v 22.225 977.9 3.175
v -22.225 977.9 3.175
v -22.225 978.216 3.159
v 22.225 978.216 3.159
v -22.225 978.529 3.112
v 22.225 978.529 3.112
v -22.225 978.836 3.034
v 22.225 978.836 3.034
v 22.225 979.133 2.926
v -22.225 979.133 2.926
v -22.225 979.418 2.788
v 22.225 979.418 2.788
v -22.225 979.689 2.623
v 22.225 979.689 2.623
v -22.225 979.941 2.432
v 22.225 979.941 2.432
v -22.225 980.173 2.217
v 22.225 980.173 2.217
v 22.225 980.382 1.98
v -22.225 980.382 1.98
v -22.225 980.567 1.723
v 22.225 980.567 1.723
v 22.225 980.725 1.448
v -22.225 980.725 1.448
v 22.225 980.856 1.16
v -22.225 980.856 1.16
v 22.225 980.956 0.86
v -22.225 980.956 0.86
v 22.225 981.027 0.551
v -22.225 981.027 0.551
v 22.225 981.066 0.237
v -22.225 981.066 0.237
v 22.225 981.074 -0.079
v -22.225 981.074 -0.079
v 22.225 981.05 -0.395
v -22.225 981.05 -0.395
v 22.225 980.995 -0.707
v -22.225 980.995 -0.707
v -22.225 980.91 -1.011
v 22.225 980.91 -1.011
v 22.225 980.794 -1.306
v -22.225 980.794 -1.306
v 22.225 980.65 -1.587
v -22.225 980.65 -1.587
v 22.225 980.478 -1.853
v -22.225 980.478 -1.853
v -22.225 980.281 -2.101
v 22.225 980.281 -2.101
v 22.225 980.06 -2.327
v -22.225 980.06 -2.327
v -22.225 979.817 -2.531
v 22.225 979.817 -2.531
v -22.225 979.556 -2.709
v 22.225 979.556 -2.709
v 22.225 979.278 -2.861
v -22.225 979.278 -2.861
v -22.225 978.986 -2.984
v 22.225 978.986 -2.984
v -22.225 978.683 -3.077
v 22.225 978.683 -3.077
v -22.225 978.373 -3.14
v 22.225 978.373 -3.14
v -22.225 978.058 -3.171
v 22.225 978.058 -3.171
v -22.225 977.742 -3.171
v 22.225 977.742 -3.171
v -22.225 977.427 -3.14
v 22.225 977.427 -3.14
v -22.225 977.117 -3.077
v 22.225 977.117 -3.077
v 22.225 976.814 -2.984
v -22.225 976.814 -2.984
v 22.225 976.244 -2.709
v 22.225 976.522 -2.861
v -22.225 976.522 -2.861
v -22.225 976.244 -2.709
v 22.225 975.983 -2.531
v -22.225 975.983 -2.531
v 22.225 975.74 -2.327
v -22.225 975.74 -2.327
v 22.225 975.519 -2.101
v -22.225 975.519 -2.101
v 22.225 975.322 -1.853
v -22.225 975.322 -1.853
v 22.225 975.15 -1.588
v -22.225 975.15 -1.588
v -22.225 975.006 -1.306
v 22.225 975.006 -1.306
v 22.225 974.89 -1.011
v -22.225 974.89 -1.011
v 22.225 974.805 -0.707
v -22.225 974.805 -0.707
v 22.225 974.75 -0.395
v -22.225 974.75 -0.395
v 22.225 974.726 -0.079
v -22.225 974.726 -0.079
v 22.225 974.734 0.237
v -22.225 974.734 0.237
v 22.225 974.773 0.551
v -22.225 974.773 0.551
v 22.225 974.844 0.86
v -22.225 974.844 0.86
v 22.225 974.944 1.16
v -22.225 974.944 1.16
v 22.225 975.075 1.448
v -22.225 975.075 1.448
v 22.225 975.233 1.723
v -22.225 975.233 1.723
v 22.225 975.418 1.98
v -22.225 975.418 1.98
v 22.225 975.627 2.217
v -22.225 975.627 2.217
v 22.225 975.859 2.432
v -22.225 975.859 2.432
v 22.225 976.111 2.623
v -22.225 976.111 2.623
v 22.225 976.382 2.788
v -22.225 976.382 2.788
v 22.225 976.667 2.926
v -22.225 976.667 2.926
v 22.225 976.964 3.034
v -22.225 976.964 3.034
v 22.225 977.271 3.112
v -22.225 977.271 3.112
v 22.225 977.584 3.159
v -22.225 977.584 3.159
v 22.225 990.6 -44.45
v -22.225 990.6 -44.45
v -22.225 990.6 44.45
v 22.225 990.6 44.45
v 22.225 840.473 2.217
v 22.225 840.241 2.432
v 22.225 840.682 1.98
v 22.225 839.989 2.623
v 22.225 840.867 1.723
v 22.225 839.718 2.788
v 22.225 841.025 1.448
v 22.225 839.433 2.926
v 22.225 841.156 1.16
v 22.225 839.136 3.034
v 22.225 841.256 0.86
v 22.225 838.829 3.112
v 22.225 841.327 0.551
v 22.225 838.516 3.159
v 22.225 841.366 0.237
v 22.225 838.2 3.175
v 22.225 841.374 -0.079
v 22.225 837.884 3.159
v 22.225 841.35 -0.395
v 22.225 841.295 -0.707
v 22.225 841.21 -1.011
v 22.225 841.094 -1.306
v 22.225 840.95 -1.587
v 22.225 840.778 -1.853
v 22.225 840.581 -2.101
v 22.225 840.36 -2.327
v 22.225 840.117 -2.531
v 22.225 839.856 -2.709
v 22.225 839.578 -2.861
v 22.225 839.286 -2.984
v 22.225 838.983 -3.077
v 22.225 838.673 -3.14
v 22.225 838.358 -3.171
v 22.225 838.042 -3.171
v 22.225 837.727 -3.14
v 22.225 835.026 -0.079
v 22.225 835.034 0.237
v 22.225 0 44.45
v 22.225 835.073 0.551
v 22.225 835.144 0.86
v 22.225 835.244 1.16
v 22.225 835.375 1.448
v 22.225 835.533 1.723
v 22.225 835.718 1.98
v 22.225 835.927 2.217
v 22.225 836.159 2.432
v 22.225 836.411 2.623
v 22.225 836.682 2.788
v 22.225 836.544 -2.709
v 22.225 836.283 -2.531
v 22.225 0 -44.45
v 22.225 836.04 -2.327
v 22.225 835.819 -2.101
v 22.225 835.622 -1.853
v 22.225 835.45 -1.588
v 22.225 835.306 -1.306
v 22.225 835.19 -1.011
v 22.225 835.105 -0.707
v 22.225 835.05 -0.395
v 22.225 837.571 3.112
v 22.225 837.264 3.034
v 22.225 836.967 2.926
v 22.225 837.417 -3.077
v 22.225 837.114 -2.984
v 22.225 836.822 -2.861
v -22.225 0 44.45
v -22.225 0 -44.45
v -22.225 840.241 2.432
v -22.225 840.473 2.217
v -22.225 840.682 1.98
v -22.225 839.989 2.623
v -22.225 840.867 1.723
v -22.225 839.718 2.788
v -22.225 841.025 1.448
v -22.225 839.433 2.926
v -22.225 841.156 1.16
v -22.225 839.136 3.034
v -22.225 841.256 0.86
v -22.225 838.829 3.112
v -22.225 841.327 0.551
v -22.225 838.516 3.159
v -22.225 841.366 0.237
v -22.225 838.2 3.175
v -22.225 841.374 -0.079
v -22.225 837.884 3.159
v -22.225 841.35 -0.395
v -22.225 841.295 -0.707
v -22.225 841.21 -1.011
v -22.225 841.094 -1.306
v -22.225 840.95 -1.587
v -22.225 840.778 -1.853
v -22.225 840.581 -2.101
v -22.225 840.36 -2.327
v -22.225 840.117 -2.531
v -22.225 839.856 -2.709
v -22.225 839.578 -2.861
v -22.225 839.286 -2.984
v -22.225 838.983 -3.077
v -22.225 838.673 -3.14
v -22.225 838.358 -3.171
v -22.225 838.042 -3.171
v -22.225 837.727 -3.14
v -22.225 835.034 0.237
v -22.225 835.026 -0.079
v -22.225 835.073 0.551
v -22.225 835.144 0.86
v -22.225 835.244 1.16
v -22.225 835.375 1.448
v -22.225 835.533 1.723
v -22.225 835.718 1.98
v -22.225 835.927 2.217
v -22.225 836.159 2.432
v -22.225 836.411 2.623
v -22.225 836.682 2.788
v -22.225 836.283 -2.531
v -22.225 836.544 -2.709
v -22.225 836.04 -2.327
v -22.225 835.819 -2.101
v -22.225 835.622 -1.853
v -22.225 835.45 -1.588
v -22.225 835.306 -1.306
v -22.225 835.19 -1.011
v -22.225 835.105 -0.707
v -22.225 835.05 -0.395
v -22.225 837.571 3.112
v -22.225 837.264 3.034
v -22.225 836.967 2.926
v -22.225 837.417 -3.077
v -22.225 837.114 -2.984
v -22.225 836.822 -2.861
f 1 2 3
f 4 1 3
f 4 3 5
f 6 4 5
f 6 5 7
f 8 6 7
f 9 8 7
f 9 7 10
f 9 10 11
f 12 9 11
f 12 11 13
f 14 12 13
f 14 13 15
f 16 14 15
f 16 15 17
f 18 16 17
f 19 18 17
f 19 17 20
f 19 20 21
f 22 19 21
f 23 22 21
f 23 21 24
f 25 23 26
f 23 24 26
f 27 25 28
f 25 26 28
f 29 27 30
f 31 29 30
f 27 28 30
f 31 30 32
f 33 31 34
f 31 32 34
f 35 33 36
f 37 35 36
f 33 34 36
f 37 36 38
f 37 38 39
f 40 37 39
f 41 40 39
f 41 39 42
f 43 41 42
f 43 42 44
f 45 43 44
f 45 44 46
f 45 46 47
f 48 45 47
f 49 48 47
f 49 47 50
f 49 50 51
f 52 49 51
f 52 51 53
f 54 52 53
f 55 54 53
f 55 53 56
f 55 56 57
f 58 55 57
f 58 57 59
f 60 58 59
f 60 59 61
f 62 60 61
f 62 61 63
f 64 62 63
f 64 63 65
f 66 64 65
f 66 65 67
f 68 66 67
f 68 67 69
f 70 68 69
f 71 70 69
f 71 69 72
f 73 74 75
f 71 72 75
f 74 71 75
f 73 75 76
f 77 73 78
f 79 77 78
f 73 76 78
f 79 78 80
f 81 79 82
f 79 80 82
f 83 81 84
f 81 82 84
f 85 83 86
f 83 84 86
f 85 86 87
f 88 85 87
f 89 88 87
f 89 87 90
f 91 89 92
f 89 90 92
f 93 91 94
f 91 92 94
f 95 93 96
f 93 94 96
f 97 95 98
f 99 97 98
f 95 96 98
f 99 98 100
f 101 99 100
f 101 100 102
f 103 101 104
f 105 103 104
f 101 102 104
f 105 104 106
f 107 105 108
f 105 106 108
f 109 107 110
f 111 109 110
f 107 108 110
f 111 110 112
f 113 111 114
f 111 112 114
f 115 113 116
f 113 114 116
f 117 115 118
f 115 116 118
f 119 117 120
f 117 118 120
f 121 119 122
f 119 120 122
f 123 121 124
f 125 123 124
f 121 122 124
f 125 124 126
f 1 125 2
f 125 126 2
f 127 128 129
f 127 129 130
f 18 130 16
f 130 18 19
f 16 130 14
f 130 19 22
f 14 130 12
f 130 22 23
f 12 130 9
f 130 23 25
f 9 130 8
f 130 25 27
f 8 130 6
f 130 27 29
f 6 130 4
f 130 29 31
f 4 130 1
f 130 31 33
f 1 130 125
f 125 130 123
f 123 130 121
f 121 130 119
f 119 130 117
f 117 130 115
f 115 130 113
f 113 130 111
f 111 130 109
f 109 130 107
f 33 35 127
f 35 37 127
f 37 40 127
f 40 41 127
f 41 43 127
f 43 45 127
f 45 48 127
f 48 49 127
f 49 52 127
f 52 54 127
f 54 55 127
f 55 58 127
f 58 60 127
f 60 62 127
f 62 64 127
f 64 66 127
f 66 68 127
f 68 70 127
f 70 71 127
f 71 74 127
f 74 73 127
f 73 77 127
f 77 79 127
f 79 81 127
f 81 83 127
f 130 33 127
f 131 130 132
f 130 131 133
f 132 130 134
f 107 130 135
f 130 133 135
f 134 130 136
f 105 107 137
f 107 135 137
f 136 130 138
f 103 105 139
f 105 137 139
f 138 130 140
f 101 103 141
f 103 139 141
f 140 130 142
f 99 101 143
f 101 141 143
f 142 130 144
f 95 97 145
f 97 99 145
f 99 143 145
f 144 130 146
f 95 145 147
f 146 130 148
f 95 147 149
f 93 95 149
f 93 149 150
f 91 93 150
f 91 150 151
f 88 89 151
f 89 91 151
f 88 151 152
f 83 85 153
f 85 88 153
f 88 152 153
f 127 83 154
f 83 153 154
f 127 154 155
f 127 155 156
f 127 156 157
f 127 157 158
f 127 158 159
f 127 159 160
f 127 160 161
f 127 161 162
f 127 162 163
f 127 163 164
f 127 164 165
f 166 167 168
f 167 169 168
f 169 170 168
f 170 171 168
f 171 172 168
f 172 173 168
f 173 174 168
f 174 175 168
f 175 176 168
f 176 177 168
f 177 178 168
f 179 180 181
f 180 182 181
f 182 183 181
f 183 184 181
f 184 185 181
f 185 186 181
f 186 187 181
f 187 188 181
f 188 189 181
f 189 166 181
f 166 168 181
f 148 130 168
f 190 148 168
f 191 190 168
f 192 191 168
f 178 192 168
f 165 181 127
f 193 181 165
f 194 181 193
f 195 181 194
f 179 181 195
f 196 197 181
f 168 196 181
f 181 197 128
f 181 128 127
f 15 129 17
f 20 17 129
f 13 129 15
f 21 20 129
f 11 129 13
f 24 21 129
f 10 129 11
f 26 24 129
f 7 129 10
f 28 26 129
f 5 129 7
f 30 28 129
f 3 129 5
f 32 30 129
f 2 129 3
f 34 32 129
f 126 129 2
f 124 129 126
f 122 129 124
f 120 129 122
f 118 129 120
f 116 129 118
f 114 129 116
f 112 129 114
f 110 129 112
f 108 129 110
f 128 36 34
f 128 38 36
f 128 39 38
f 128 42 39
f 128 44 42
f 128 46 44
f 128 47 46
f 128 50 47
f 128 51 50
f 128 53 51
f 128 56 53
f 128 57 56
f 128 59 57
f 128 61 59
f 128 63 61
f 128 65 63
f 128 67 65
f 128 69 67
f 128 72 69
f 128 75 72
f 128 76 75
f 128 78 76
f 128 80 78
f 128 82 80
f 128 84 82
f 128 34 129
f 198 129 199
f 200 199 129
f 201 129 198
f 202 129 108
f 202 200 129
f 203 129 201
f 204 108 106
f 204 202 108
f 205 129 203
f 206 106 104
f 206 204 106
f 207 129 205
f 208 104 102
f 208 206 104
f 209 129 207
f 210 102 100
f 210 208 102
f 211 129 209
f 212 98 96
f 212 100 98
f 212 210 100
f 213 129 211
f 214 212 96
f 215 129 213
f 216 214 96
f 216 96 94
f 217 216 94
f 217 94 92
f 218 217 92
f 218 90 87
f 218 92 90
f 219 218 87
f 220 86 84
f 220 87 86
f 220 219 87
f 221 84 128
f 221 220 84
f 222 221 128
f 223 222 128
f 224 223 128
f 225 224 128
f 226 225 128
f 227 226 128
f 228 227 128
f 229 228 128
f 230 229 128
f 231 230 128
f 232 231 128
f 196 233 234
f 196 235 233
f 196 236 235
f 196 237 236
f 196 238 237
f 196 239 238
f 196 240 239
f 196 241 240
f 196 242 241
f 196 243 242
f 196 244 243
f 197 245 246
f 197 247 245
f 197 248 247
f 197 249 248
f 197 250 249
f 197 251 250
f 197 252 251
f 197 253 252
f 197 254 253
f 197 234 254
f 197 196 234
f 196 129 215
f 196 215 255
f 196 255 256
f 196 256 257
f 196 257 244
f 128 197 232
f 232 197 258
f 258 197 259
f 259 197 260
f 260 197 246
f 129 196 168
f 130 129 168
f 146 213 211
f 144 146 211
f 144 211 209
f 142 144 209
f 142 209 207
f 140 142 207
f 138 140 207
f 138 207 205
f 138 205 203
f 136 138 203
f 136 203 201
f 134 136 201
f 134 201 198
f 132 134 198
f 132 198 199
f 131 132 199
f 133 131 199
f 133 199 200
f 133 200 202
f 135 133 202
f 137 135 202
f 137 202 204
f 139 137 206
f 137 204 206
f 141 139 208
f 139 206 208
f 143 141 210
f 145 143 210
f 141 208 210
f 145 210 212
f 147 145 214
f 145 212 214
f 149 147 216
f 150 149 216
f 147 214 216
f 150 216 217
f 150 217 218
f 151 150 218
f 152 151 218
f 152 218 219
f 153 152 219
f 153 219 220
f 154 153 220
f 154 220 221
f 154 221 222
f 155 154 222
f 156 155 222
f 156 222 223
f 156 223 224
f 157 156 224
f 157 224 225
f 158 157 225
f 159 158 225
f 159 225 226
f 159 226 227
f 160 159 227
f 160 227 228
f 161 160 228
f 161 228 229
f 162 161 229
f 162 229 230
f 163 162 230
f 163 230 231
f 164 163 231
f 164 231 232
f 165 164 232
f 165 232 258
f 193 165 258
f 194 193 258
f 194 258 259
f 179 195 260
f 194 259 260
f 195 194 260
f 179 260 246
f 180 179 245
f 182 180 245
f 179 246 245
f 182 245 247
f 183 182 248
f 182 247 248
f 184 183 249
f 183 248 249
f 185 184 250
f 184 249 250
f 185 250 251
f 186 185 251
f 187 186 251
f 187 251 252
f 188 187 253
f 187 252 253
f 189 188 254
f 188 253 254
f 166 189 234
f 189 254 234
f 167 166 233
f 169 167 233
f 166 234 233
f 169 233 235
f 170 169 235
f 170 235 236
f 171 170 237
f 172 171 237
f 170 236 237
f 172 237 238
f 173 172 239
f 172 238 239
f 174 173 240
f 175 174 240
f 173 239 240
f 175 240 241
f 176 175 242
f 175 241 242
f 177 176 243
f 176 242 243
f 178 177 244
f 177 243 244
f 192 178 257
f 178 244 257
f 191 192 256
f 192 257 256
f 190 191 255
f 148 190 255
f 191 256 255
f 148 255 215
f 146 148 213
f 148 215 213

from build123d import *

# Parameters (mm, degrees)
SKETCH1_W           = 44.45
SKETCH1_H           = 88.9
BOSS_EXTRUDE1_DEPTH = 990.6
SKETCH2_R           = 3.175
CUT_EXTRUDE1_DEPTH  = 977.9


with BuildPart() as part:
    # Sketch1 → Boss-Extrude1 (new body)
    with BuildSketch(Plane(origin=(0, 0, 0), x_dir=(1, 0, 0), z_dir=(0, 1, 0))):
        Rectangle(SKETCH1_W, SKETCH1_H)
    extrude(amount=BOSS_EXTRUDE1_DEPTH)

    # Sketch2 → Cut-Extrude1 (cut)
    with BuildSketch(Plane.ZY.offset(22.225)):
        with Locations((0, 977.9)):
            Circle(SKETCH2_R)
        with Locations((0, 838.2)):
            Circle(SKETCH2_R)
    extrude(amount=-CUT_EXTRUDE1_DEPTH, mode=Mode.SUBTRACT)


solid = part.part
